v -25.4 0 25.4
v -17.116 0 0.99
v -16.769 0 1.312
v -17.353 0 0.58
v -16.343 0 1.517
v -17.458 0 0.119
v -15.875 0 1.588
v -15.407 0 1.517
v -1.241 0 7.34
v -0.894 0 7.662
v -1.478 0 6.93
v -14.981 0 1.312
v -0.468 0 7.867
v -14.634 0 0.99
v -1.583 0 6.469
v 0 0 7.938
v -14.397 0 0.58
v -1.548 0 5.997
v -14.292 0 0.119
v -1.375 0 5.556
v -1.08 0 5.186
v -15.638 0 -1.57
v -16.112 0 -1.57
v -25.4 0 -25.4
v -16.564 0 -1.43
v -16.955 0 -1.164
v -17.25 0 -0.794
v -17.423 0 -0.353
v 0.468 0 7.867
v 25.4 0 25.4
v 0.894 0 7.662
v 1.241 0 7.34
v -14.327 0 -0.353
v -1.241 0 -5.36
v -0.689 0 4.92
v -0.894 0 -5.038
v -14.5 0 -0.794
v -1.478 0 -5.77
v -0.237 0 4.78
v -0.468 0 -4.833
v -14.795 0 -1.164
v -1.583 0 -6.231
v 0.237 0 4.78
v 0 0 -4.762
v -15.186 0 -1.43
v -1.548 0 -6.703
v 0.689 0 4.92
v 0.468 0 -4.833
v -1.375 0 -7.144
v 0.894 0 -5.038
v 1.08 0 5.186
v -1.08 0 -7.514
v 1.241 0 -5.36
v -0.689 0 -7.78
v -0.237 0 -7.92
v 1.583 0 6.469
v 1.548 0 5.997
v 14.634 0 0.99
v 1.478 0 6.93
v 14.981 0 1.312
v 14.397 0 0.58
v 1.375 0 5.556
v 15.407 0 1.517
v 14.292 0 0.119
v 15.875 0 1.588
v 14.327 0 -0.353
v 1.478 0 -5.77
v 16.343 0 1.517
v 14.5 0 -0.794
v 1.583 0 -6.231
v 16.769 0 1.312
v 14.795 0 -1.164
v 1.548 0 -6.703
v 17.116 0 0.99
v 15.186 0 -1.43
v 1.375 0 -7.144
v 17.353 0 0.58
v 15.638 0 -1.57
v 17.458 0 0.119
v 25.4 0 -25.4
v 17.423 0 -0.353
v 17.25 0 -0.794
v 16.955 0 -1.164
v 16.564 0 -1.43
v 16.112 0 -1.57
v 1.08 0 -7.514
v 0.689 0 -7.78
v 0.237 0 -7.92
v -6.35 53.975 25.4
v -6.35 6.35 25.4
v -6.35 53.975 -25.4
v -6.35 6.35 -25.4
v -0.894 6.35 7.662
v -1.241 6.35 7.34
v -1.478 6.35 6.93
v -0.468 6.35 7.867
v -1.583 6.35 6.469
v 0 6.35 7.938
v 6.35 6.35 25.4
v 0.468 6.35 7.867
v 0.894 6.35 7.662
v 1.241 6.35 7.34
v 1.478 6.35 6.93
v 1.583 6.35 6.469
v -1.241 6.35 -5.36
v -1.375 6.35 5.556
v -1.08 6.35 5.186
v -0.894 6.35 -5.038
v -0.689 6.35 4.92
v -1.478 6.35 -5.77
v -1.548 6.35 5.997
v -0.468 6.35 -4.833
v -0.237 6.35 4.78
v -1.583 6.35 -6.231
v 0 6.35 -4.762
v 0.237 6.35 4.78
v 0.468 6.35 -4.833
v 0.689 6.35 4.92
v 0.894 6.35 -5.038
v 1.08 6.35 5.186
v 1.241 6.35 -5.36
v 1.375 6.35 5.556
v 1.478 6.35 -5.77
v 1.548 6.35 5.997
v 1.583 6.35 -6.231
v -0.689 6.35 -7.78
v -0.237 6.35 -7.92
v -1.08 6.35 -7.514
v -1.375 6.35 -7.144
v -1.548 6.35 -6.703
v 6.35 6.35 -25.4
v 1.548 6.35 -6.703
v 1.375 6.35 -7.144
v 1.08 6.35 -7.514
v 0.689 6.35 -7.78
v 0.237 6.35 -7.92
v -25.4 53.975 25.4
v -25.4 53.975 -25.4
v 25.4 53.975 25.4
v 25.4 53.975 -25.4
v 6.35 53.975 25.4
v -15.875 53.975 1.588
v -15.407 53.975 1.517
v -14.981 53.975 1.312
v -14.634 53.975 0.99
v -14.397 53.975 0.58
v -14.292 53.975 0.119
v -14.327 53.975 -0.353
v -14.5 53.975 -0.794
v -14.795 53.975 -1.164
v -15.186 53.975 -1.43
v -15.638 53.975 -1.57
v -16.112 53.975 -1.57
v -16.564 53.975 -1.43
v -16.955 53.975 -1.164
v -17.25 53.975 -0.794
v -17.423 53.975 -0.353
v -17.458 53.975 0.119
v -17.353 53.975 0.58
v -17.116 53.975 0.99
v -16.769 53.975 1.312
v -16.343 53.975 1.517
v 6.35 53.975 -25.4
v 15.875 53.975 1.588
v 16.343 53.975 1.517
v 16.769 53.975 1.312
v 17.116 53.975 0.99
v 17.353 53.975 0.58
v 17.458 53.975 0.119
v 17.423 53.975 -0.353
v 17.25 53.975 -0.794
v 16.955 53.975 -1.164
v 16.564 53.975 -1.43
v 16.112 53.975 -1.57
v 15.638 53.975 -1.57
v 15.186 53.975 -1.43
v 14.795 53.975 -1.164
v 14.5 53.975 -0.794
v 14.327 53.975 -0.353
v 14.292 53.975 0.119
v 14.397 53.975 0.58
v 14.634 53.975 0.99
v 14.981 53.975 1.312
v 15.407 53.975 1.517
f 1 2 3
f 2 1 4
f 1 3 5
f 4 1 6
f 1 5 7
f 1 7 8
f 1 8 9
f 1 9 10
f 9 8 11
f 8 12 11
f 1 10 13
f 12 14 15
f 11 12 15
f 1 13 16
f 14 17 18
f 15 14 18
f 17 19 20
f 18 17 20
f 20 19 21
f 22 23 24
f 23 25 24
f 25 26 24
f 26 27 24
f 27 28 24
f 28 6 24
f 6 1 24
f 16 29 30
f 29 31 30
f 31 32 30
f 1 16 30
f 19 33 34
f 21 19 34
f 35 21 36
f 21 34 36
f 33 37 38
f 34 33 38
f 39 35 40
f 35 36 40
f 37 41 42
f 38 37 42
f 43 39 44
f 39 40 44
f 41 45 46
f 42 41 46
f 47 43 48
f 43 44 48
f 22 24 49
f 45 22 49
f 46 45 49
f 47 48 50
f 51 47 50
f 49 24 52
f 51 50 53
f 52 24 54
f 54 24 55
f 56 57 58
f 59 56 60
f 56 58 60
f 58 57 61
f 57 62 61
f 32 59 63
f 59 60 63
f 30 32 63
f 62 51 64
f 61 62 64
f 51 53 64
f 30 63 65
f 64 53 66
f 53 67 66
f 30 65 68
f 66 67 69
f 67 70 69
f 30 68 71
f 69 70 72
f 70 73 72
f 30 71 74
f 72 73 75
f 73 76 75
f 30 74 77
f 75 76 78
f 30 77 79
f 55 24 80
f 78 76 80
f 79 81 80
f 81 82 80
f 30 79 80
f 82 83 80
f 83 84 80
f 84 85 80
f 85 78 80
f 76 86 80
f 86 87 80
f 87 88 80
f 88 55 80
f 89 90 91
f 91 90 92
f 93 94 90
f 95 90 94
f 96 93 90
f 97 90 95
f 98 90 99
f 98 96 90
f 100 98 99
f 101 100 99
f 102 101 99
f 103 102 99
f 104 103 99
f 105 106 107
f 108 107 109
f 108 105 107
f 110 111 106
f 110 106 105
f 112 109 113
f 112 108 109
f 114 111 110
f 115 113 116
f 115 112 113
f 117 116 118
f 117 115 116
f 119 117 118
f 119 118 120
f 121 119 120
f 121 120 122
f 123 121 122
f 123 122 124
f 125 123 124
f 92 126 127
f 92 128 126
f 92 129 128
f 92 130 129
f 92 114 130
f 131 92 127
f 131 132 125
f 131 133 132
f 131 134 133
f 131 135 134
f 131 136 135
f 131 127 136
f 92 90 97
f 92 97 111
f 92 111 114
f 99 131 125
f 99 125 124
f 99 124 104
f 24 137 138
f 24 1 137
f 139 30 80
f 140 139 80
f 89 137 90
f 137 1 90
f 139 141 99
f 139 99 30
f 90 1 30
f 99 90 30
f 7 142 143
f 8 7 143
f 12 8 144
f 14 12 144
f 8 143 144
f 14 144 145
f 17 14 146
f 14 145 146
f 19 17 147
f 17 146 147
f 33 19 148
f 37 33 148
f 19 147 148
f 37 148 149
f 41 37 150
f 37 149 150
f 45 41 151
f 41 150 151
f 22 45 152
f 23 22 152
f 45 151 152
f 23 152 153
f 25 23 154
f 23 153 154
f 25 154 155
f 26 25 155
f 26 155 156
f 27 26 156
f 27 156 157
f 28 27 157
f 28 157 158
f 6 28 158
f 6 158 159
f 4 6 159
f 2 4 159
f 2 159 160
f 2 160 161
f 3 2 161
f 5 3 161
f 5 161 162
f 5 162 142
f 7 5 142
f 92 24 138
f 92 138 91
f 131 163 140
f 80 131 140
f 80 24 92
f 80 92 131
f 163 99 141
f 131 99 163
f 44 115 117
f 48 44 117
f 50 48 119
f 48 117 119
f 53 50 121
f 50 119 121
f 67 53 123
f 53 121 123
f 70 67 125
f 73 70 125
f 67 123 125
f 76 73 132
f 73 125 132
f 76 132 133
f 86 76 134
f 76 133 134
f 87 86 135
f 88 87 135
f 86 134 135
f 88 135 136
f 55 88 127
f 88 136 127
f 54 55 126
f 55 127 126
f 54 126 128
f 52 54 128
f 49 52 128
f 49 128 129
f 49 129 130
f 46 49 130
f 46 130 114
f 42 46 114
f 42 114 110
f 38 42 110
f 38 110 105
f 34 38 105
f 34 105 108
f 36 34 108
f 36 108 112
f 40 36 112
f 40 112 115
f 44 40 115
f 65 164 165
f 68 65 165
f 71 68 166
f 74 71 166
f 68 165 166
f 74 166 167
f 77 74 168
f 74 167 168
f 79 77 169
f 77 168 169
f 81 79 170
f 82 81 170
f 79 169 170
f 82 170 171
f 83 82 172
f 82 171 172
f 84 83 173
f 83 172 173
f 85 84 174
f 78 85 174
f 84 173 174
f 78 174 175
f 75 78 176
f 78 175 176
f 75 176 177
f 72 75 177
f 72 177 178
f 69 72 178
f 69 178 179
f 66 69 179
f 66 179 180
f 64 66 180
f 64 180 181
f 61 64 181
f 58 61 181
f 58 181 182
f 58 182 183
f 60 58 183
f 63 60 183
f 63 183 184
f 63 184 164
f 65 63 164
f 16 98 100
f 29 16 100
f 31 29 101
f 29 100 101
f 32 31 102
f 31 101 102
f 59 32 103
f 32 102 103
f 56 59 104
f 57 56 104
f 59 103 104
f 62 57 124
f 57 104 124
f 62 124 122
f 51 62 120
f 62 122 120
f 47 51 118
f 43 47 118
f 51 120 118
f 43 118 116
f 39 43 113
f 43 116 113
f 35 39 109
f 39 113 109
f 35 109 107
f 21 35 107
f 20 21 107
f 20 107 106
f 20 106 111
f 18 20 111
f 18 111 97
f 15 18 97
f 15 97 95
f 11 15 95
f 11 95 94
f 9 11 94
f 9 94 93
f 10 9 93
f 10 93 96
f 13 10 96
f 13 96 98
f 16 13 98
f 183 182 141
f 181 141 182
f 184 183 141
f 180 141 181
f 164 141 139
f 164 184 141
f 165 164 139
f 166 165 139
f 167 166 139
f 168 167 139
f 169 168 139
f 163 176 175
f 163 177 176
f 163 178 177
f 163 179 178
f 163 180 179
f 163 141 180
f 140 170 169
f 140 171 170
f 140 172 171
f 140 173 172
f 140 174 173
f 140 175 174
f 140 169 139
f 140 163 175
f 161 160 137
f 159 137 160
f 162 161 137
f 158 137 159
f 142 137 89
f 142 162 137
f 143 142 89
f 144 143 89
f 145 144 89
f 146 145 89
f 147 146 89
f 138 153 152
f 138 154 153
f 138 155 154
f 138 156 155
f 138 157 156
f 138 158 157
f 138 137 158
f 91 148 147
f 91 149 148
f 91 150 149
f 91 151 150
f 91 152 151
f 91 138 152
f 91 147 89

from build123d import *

# Parameters (mm, degrees)
SKETCH1_W           = 50.8
SKETCH1_H           = 50.8
BOSS_EXTRUDE1_DEPTH = 6.35
SKETCH2_W           = 19.05
SKETCH2_H           = 50.8
BOSS_EXTRUDE2_DEPTH = 47.625
SKETCH3_R           = 1.5875
CUT_EXTRUDE1_DEPTH  = 60.652834174
SKETCH4_R           = 1.5875
CUT_EXTRUDE2_DEPTH  = 65.835334695


with BuildPart() as part:
    # Sketch1 → Boss-Extrude1 (new body)
    with BuildSketch(Plane(origin=(0, 0, 0), x_dir=(1, 0, 0), z_dir=(0, 1, 0))):
        Rectangle(SKETCH1_W, SKETCH1_H)
    extrude(amount=BOSS_EXTRUDE1_DEPTH)

    # Sketch2 → Boss-Extrude2 (add)
    with BuildSketch(Plane(origin=(0, 6.35, 0), x_dir=(1, 0, 0), z_dir=(0, 1, 0))):
        with Locations((-15.875, 0)):
            Rectangle(SKETCH2_W, SKETCH2_H)
        with Locations((15.875, 0)):
            Rectangle(SKETCH2_W, SKETCH2_H)
    extrude(amount=BOSS_EXTRUDE2_DEPTH)

    # Sketch3 → Cut-Extrude1 (cut, through all)
    with BuildSketch(Plane(origin=(0, 6.35, 0), x_dir=(1, 0, 0), z_dir=(0, 1, 0))):
        with Locations(Location((0, 6.35, 0), (0, 0, 270))):
            Circle(SKETCH3_R)
        with Locations(Location((0, -6.35, 0), (0, 0, 270))):
            Circle(SKETCH3_R)
    extrude(amount=-CUT_EXTRUDE1_DEPTH, mode=Mode.SUBTRACT)

    # Sketch4 → Cut-Extrude2 (cut, through all)
    with BuildSketch(Plane(origin=(0, 53.975, 0), x_dir=(1, 0, 0), z_dir=(0, 1, 0))):
        with Locations(Location((-15.875, 0, 0), (0, 0, 270))):
            Circle(SKETCH4_R)
        with Locations(Location((15.875, 0, 0), (0, 0, 270))):
            Circle(SKETCH4_R)
    extrude(amount=-CUT_EXTRUDE2_DEPTH, mode=Mode.SUBTRACT)


solid = part.part
